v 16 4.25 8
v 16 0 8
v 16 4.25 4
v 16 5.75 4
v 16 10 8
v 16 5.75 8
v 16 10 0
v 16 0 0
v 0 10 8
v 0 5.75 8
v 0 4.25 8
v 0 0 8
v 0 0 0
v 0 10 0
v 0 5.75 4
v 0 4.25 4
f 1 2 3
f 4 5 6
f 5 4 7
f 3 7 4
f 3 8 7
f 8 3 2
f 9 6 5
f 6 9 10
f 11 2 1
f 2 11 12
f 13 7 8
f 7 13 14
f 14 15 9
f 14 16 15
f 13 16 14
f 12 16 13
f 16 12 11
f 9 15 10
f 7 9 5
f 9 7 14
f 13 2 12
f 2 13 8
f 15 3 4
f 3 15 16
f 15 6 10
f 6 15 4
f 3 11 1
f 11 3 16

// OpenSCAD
$fn = 32;

// ----------------------------------------------------------------------
// Micro clip: slotted block, 5-20 mm class
// ----------------------------------------------------------------------

// --- parameters (mm) ---
block_l = 16;             // block length, X
block_w = 10;             // block width, Y
block_h = 8;              // block height, Z
slot_w = 1.5;             // slot width
slot_d = 4;               // slot depth from the top

difference() {
  cube([block_l, block_w, block_h]);
  translate([-1, block_w / 2 - slot_w / 2, block_h - slot_d])
    cube([block_l + 2, slot_w, slot_d + 1]);
}
